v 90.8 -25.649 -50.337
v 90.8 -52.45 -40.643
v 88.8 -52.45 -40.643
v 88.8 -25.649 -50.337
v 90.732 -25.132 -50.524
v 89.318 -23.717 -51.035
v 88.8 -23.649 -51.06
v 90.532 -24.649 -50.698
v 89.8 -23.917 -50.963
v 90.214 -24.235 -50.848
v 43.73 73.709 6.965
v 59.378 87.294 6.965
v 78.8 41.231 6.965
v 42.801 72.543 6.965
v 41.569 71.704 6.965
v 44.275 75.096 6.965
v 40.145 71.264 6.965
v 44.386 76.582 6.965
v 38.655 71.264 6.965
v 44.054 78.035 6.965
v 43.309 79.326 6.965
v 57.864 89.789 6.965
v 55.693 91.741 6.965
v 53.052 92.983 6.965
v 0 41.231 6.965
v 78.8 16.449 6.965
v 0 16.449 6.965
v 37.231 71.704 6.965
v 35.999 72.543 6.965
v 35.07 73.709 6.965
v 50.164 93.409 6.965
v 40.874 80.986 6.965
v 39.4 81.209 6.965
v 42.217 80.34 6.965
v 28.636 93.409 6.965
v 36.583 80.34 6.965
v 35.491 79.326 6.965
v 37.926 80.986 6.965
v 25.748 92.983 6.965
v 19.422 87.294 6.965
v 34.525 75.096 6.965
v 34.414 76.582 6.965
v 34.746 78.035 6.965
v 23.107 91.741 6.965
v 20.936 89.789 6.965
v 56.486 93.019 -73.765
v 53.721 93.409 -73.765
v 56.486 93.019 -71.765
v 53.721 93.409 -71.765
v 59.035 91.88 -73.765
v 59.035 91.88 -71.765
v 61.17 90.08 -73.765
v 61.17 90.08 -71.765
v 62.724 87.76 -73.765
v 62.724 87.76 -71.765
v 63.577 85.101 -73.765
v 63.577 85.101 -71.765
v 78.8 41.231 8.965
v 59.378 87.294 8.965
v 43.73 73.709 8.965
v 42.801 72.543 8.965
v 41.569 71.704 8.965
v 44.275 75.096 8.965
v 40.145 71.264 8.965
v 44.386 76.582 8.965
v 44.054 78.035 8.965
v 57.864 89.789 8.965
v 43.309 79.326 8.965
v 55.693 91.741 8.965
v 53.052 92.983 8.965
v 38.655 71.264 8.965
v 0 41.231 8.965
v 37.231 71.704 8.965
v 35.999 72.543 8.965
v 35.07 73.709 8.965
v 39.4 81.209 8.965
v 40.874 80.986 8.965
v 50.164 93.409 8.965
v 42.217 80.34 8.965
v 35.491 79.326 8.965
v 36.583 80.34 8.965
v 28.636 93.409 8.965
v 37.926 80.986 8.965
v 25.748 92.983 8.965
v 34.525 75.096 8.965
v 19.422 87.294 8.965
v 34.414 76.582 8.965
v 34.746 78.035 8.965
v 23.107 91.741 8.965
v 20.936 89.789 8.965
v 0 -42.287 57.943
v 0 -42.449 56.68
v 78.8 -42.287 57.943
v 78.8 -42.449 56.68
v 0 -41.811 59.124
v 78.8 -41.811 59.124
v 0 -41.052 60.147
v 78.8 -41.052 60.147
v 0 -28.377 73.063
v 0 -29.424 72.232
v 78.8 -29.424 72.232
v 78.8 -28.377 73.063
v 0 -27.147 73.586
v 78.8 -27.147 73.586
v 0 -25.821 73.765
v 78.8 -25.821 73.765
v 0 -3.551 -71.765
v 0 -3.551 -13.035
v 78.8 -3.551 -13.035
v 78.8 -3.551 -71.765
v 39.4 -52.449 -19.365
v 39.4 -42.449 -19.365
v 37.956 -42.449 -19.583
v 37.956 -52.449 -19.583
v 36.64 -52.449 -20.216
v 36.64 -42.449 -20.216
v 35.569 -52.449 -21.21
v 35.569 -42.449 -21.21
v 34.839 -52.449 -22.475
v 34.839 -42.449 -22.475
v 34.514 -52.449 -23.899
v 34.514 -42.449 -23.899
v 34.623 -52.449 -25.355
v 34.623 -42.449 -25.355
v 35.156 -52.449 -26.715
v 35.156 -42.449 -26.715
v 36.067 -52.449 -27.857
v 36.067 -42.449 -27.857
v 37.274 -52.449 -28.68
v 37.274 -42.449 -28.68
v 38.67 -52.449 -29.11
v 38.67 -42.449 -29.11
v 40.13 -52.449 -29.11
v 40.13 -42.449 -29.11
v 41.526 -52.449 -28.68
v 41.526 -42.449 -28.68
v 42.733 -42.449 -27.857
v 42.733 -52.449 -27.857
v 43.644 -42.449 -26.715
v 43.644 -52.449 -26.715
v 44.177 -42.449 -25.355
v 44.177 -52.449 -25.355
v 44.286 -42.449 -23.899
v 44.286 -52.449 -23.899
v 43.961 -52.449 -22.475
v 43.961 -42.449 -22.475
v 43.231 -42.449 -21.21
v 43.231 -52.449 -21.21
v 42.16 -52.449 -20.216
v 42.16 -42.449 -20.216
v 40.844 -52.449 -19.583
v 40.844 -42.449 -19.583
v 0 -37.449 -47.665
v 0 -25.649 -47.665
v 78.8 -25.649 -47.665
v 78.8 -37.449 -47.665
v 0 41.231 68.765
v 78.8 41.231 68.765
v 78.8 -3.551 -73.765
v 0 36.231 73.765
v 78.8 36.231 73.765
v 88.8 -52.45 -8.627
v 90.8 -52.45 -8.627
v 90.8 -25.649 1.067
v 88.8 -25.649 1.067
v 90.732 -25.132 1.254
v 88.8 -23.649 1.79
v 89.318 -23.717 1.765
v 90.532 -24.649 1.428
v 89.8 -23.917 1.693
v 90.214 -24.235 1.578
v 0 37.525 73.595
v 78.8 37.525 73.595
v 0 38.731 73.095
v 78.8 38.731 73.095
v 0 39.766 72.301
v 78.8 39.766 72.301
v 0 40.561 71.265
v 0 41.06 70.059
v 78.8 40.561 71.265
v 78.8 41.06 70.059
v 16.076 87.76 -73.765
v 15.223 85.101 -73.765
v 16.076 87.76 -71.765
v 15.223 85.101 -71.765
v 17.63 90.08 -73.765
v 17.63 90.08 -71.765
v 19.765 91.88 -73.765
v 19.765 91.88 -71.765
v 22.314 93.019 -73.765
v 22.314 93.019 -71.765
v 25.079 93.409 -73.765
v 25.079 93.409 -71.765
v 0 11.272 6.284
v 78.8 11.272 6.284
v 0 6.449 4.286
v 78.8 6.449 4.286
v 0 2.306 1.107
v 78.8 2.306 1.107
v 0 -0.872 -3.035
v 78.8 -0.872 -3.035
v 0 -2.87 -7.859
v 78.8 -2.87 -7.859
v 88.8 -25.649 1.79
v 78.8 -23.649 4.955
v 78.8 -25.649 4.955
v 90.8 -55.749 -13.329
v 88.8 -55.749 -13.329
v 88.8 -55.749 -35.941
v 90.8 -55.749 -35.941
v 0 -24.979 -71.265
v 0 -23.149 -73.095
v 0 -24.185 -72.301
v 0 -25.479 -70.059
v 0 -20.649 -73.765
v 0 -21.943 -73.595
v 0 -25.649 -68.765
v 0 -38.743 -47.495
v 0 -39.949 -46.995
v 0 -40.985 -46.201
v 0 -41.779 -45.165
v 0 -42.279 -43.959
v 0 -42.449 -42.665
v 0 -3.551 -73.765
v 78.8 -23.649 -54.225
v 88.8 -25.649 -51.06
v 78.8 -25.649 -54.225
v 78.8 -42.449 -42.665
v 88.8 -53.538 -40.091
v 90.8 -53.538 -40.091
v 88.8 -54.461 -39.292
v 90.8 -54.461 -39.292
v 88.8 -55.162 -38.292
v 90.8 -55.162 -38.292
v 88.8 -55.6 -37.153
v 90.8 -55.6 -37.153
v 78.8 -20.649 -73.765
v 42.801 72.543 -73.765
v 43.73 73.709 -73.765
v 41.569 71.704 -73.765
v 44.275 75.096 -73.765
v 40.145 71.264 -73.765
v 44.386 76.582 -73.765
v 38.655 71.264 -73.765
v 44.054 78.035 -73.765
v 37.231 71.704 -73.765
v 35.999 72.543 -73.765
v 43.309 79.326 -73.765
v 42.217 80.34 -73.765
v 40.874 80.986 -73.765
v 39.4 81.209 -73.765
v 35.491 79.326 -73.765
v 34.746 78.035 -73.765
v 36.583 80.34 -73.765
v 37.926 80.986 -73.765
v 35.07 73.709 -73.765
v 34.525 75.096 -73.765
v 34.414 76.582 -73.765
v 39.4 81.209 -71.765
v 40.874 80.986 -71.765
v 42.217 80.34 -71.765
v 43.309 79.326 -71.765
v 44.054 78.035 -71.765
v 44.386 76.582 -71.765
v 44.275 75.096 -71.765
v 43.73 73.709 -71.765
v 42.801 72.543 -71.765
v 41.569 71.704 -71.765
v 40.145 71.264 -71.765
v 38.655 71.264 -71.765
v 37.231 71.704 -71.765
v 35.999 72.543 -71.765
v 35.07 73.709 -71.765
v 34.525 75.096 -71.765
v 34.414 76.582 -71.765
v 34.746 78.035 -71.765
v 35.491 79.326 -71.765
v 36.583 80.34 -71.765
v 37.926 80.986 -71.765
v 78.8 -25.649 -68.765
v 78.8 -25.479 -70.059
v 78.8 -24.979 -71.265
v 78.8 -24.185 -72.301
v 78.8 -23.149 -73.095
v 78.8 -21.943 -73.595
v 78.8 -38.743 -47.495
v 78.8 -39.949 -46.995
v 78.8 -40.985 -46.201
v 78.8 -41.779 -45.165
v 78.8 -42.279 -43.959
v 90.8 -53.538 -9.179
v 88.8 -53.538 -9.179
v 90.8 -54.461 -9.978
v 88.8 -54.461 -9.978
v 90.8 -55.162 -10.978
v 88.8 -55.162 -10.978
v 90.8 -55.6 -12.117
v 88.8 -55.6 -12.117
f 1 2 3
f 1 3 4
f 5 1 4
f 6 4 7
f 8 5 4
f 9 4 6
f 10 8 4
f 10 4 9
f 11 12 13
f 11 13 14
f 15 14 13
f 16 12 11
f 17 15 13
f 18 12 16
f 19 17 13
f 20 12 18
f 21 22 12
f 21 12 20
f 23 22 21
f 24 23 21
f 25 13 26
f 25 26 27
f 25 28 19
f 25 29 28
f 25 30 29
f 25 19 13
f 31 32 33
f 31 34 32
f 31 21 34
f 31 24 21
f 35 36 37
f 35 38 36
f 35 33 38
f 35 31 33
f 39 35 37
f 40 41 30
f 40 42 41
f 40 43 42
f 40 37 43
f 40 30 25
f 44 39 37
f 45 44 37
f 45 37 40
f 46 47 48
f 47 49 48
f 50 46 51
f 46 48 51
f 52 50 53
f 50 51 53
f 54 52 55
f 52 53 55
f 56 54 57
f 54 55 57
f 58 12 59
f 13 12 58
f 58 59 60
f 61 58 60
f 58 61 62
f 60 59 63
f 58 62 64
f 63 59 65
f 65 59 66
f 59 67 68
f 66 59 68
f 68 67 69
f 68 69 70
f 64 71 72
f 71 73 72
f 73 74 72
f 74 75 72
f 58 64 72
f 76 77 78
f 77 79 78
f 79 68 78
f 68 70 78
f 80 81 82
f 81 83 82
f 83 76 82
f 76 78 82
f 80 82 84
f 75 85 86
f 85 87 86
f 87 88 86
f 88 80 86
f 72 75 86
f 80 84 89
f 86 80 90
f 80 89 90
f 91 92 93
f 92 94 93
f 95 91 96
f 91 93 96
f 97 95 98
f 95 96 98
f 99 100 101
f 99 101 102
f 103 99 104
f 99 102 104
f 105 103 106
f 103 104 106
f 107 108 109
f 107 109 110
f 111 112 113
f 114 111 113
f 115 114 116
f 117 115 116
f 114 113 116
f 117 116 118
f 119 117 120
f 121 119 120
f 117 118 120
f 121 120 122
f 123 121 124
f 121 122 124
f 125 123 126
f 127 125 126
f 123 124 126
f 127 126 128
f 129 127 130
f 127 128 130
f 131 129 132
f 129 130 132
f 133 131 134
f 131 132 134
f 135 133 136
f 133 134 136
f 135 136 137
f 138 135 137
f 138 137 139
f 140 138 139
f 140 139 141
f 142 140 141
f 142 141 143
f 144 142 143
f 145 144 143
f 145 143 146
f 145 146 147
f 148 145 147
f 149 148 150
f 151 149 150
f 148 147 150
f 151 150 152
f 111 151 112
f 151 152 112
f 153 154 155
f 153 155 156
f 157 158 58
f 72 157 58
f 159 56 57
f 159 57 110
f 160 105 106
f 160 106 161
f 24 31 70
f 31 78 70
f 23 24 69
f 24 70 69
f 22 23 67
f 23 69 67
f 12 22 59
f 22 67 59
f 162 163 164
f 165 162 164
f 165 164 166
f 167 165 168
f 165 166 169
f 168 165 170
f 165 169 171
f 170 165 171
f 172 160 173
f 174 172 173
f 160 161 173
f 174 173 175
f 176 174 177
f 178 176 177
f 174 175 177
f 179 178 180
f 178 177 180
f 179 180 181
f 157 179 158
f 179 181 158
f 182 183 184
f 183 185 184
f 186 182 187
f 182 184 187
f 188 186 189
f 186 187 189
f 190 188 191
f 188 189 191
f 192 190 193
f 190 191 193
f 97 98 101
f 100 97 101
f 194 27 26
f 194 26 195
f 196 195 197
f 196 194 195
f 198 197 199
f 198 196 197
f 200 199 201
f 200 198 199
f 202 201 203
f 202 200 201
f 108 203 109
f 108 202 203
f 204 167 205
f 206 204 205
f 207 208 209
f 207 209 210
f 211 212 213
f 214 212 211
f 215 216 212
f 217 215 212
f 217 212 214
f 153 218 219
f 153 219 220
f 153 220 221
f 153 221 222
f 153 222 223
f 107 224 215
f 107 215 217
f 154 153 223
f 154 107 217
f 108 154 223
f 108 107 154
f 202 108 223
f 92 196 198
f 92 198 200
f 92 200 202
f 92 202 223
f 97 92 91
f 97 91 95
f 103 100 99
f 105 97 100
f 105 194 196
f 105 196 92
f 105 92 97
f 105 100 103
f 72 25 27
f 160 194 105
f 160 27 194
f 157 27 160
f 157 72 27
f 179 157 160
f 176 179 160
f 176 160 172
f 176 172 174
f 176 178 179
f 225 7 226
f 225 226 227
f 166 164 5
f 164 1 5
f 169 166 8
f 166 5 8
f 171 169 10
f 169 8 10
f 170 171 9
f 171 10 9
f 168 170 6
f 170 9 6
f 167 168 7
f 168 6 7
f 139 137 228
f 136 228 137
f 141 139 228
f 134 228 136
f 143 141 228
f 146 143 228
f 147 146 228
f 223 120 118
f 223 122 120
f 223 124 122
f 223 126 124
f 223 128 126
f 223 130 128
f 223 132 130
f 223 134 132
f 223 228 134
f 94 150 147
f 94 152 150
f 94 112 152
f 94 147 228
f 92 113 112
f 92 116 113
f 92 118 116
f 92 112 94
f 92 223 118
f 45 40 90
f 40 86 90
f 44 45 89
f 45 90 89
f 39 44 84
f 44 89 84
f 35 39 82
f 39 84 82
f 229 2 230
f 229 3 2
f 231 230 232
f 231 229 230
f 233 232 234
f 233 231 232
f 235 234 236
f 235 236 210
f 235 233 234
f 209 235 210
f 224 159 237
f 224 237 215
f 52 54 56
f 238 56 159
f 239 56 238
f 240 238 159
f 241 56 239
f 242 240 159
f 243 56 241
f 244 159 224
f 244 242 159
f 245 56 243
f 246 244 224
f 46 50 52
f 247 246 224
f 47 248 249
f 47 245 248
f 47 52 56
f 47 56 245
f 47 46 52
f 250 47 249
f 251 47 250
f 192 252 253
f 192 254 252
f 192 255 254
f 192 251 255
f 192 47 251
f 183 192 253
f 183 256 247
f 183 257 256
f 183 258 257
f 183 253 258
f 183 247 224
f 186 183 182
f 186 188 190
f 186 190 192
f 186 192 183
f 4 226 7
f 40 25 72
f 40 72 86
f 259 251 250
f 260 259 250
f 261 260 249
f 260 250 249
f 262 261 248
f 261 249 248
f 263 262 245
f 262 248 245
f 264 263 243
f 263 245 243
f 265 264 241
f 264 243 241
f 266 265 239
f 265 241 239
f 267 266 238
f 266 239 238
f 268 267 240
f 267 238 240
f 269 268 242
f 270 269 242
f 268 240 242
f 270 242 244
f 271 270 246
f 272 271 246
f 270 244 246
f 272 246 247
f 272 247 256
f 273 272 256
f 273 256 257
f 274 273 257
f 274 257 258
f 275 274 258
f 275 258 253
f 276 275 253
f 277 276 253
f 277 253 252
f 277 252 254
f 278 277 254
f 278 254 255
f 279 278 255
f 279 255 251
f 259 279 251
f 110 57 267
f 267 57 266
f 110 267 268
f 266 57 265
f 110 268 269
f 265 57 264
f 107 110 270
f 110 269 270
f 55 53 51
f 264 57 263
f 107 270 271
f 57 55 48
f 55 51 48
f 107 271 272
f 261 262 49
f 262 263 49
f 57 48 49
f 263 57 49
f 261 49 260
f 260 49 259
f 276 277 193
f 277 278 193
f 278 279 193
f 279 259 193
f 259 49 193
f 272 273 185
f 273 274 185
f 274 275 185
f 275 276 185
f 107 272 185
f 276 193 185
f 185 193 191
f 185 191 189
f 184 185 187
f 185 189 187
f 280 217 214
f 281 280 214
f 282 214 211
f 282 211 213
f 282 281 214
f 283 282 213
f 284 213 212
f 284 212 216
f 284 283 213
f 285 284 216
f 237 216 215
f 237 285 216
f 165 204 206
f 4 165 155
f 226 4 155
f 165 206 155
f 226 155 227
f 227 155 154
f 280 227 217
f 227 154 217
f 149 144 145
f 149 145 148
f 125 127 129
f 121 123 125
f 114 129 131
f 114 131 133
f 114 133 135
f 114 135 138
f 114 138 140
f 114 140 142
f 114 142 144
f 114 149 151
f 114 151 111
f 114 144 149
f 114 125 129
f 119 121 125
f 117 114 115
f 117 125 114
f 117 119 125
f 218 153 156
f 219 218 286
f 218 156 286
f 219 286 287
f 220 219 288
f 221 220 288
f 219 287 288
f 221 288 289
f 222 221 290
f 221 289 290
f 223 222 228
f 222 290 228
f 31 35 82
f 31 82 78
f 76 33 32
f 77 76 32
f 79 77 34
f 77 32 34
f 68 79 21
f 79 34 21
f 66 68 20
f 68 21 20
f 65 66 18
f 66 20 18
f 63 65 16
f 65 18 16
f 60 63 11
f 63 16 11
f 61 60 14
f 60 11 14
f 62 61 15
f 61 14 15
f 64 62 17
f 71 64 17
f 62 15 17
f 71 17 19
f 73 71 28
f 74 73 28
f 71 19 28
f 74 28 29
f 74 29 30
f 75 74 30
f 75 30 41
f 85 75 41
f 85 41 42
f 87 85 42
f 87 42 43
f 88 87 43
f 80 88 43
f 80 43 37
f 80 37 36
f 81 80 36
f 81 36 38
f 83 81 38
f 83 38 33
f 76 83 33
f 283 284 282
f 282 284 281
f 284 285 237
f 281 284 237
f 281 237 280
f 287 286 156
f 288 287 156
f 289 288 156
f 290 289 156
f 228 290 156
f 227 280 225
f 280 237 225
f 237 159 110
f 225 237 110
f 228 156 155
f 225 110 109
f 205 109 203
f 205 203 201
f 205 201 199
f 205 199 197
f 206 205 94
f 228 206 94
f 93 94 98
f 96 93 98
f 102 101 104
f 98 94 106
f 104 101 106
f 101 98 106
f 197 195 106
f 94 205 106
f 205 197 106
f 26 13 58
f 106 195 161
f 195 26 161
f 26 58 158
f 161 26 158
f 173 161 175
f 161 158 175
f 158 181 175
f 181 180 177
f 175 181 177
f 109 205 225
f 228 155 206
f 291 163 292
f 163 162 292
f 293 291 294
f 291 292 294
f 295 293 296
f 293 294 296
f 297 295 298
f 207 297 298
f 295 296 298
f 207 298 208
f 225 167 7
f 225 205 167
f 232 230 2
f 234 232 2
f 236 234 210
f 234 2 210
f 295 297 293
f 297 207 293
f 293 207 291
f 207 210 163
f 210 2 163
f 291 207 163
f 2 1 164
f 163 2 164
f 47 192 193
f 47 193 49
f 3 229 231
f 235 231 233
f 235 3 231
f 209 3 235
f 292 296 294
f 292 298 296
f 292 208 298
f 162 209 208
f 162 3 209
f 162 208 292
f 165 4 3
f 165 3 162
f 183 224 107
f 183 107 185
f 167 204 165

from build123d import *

# Parameters (mm, degrees)
BOSS_EXTRUDE1_DEPTH = 78.8
BOSS_EXTRUDE2_DEPTH = 2
FILLET2_R           = 10
BOSS_EXTRUDE3_DEPTH = 2
FILLET3_R           = 10
FILLET6_R           = 5
CUT_EXTRUDE1_REACH  = 193.572
SKETCH6_R           = 5
BOSS_EXTRUDE4_DEPTH = 10
CUT_EXTRUDE2_REACH  = 166.406
SKETCH10_W          = 52.85
SKETCH10_H          = 2
BOSS_EXTRUDE5_DEPTH = 2
SKETCH11_W          = 2
SKETCH11_H          = 52.85
BOSS_EXTRUDE6_DEPTH = 30.1
CUT_EXTRUDE3_DEPTH  = 2
FILLET9_R           = 5
FILLET11_R          = 2
SKETCH13_R          = 4.9
BOSS_EXTRUDE7_DEPTH = 10


with BuildPart() as part:
    # Sketch2 → Boss-Extrude1 (new body)
    with BuildSketch(Plane(origin=(0, 0, 0), x_dir=(0, 0, -1), z_dir=(1, 0, 0))):
        with BuildLine():
            Line((73.765, -25.649165393), (47.665, -25.649165393))
            Line((47.665, -25.649165393), (47.665, -42.449165393))
            Line((47.665, -42.449165393), (-58.695, -42.449165393))
            Line((-58.695, -42.449165393), (-73.765, -27.949165393))
            Line((-73.765, -27.949165393), (-73.765, 41.230834607))
            Line((-73.765, 41.230834607), (-6.965, 41.230834607))
            Line((-6.965, 41.230834607), (-6.965, 16.448577099))
            ThreePointArc((-6.965, 16.448577099), (-1.107135624, 2.306441476), (13.035, -3.551422901))
            Line((13.035, -3.551422901), (73.765, -3.551422901))
            Line((73.765, -3.551422901), (73.765, -25.649165393))
        make_face()
    extrude(amount=BOSS_EXTRUDE1_DEPTH)

    # Sketch4 → Boss-Extrude2 (add)
    with BuildSketch(Plane(origin=(0, 0, -73.765), x_dir=(-1, 0, 0), z_dir=(0, 0, -1))):
        Polygon((-78.8, -3.551422901), (0, -3.551422901), (-16.65, 93.408577099), (-62.15, 93.408577099), align=None)
    extrude(amount=-BOSS_EXTRUDE2_DEPTH)

    # Fillet2
    fillet2_edges = [part.edges().sort_by_distance(p)[0] for p in [
        (62.15, 93.408577099, -72.765),
        (16.65, 93.408577099, -72.765),
    ]]
    fillet(fillet2_edges, radius=FILLET2_R)

    # Sketch5 → Boss-Extrude3 (add)
    with BuildSketch(Plane(origin=(0, 0, 6.965), x_dir=(-1, 0, 0), z_dir=(0, 0, -1))):
        Polygon((-78.8, 41.230834607), (0, 41.230834607), (-22, 93.408577099), (-56.8, 93.408577099), align=None)
    extrude(amount=-BOSS_EXTRUDE3_DEPTH)

    # Fillet3
    fillet3_edges = [part.edges().sort_by_distance(p)[0] for p in [
        (56.8, 93.408577099, 7.965),
        (22, 93.408577099, 7.965),
    ]]
    fillet(fillet3_edges, radius=FILLET3_R)

    # Fillet6
    fillet6_edges = [part.edges().sort_by_distance(p)[0] for p in [
        (39.4, 41.230834607, 73.765),
        (39.4, -25.649165393, -73.765),
        (39.4, -42.449165393, -47.665),
        (39.4, -42.449165393, 58.695),
        (39.4, -27.949165393, 73.765),
    ]]
    fillet(fillet6_edges, radius=FILLET6_R)

    # Cut-Extrude1: up to this face of the body (flat: up to its plane)
    cut_extrude1_end = Plane(part.part.faces().sort_by_distance((39.4, 63.802944074, 8.965))[0])
    # Sketch6 → Cut-Extrude1 (cut, up to the picked face)
    with BuildSketch(Plane(origin=(0, 0, -73.765), x_dir=(-1, 0, 0), z_dir=(0, 0, -1)), mode=Mode.PRIVATE) as cut_extrude1_sk1:
        with Locations(Location((-39.4, 76.208577099, 0), (0, 0, 90))):
            Circle(SKETCH6_R)
    cut_extrude1_tool1 = split(extrude(cut_extrude1_sk1.sketch, amount=-CUT_EXTRUDE1_REACH, mode=Mode.PRIVATE), bisect_by=cut_extrude1_end, keep=Keep.BOTH, mode=Mode.PRIVATE)
    add(cut_extrude1_tool1.solids().sort_by(Axis((39.4, 76.208577, -73.765), (0, 0, 1)))[0], mode=Mode.SUBTRACT)

    # Sketch7 → Boss-Extrude4 (add)
    with BuildSketch(Plane(origin=(78.8, 0, 0), x_dir=(0, 0, -1), z_dir=(1, 0, 0))):
        Polygon((54.225, -25.649165393), (47.665, -25.649165393), (-4.955, -25.649165393), (-4.955, -23.649165393), (54.225, -23.649165393), align=None)
    extrude(amount=BOSS_EXTRUDE4_DEPTH)

    # Sketch9 → Cut-Extrude2 (cut, up to next)
    with BuildSketch(Plane(origin=(0, -23.649165393, 0), x_dir=(1, 0, 0), z_dir=(0, 1, 0)), mode=Mode.PRIVATE) as cut_extrude2_sk1:
        Polygon((88.8, 51.06), (78.8, 54.225), (88.8, 54.225), align=None)
    cut_extrude2_tool1 = extrude(cut_extrude2_sk1.sketch, amount=-CUT_EXTRUDE2_REACH, mode=Mode.PRIVATE) & part.part
    # Sketch9 → Cut-Extrude2 (cut, up to next)
    with BuildSketch(Plane(origin=(0, -23.649165393, 0), x_dir=(1, 0, 0), z_dir=(0, 1, 0)), mode=Mode.PRIVATE) as cut_extrude2_sk2:
        Polygon((88.8, -1.79), (78.8, -4.955), (88.8, -4.955), align=None)
    cut_extrude2_tool2 = extrude(cut_extrude2_sk2.sketch, amount=-CUT_EXTRUDE2_REACH, mode=Mode.PRIVATE) & part.part
    add(cut_extrude2_tool1.solids().sort_by_distance((85.466667, -23.649165, -53.17))[0], mode=Mode.SUBTRACT)
    add(cut_extrude2_tool2.solids().sort_by_distance((85.466667, -23.649165, 3.9))[0], mode=Mode.SUBTRACT)

    # Sketch10 → Boss-Extrude5 (add)
    with BuildSketch(Plane(origin=(88.8, 0, 0), x_dir=(0, 0, -1), z_dir=(1, 0, 0))):
        with Locations((24.635, -24.649165393)):
            Rectangle(SKETCH10_W, SKETCH10_H)
    extrude(amount=BOSS_EXTRUDE5_DEPTH)

    # Sketch11 → Boss-Extrude6 (add)
    with BuildSketch(Plane.XZ.offset(25.649165393)):
        with Locations((89.8, -24.635)):
            Rectangle(SKETCH11_W, SKETCH11_H)
    extrude(amount=BOSS_EXTRUDE6_DEPTH)

    # Sketch12 → Cut-Extrude3 (cut)
    with BuildSketch(Plane(origin=(90.8, 0, 0), x_dir=(0, 0, -1), z_dir=(1, 0, 0))):
        Polygon((9.82, -55.749165393), (-1.79, -23.649165393), (-1.79, -55.749165393), align=None)
        Polygon((39.45, -55.749165393), (51.06, -23.649165393), (51.06, -55.749165393), align=None)
    extrude(amount=-CUT_EXTRUDE3_DEPTH, mode=Mode.SUBTRACT)

    # Fillet9
    fillet9_edges = [part.edges().sort_by_distance(p)[0] for p in [
        (89.8, -55.749165393, -9.82),
        (89.8, -55.749165393, -39.45),
    ]]
    fillet(fillet9_edges, radius=FILLET9_R)

    # Fillet11
    fillet11_edges = [part.edges().sort_by_distance(p)[0] for p in [
        (90.8, -23.649165393, -24.635),
    ]]
    fillet(fillet11_edges, radius=FILLET11_R)

    # Sketch13 → Boss-Extrude7 (add)
    with BuildSketch(Plane.XZ.offset(42.449165393)):
        with Locations(Location((39.4, -24.265, 0), (0, 0, 90))):
            Circle(SKETCH13_R)
    extrude(amount=BOSS_EXTRUDE7_DEPTH)


solid = part.part
